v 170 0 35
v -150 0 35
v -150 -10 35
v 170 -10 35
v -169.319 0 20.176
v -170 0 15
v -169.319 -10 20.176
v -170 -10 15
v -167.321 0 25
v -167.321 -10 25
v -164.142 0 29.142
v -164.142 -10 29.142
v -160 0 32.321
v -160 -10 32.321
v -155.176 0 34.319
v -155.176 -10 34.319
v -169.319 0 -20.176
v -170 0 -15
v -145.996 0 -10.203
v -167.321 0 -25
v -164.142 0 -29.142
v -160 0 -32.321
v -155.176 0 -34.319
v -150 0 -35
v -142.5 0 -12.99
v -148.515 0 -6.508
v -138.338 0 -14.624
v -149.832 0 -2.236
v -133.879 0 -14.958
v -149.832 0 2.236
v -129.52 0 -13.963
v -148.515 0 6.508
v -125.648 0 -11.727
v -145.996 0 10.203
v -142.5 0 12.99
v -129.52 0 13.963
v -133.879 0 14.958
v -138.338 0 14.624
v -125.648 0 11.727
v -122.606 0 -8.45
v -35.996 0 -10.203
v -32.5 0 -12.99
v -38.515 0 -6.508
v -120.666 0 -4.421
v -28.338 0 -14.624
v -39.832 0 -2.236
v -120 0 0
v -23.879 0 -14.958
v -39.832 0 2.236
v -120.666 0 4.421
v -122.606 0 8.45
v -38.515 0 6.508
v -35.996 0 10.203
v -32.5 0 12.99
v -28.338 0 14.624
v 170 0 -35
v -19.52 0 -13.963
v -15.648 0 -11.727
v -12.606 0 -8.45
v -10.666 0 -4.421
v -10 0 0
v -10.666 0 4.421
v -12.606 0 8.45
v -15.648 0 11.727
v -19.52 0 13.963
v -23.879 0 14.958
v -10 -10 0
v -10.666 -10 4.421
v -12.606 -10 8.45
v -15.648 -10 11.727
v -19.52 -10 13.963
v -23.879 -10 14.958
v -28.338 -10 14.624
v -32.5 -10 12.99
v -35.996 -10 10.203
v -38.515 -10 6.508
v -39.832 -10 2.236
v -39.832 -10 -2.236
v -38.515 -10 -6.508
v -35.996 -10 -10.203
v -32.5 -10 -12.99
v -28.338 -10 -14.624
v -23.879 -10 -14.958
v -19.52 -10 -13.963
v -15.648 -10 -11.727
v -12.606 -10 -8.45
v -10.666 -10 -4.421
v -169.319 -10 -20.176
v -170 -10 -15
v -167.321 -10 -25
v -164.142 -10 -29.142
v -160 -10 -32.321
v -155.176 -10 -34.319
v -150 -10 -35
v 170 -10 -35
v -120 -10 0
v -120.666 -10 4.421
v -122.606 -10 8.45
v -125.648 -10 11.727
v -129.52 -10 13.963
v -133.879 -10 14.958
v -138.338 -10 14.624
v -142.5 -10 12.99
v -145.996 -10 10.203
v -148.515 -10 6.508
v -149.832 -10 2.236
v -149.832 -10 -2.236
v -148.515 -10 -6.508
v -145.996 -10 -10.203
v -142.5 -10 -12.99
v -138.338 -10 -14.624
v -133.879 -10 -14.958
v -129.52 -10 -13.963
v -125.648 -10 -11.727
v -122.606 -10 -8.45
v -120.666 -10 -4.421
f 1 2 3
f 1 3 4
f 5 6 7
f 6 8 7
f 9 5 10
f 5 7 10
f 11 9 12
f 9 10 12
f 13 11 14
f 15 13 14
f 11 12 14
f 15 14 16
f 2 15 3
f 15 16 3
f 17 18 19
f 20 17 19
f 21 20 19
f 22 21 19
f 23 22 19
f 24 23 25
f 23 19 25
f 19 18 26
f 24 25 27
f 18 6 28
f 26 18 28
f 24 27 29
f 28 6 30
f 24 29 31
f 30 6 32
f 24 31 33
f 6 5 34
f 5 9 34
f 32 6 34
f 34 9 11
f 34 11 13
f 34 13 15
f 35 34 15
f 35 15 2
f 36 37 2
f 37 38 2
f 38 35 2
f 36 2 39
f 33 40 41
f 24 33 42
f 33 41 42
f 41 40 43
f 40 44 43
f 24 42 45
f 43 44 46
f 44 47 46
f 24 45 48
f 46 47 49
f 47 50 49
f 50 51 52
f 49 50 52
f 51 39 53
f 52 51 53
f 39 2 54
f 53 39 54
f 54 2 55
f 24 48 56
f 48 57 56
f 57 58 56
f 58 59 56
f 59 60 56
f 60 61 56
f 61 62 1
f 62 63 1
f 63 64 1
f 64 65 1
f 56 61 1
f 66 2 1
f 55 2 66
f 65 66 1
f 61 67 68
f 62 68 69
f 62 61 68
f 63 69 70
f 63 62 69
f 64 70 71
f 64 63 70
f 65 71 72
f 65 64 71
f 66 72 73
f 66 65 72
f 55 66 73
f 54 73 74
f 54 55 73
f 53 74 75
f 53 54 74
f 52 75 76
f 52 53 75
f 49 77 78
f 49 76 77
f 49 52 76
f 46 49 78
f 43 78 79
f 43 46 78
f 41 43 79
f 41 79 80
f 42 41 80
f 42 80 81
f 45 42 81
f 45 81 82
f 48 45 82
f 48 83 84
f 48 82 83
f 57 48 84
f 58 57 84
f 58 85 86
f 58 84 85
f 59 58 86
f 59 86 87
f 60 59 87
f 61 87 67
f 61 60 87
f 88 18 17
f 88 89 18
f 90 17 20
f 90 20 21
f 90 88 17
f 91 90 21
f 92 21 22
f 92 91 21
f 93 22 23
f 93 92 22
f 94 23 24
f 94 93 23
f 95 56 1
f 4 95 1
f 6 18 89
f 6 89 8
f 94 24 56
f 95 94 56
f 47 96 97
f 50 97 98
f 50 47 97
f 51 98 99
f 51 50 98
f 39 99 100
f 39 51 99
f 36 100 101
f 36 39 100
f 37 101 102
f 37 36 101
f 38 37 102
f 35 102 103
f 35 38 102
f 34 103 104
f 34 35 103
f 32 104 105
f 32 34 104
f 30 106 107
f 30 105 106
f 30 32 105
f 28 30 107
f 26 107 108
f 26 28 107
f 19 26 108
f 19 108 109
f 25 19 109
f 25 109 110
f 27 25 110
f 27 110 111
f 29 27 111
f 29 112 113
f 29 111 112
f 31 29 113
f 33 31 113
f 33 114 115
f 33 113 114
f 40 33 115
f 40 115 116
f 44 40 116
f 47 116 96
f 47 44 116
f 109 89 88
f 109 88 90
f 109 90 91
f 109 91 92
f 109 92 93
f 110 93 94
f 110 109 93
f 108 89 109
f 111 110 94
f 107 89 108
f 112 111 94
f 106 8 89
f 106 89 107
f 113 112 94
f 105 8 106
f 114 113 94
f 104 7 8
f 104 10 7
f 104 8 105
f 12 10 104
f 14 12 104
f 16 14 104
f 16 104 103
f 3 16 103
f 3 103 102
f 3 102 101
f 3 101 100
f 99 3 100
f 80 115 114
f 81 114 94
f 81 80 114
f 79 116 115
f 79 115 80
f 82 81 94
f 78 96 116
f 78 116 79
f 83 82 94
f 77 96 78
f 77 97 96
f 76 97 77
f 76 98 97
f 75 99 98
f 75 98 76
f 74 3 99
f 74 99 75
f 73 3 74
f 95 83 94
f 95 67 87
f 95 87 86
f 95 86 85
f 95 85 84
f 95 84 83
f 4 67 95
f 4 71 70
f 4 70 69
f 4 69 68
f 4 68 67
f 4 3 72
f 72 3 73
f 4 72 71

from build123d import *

# Parameters (mm, degrees)
F0_W          = 340
F0_H          = 70
F1_DEPTH      = 10
F2_R          = 20
F3_R          = 15
F4_DEPTH      = 353
F4_DEPTH_BACK = 25


# Not quite as in the source:
# - an extrude ends at something that could not be found from the text; its depth is read off the source's solid


with BuildPart() as f1:
    # F0 (on Front) → F1 (new body)
    with BuildSketch(Plane.XZ):
        Rectangle(F0_W, F0_H)
    extrude(amount=F1_DEPTH)

    # F2
    f2_edges = [f1.edges().sort_by_distance(p)[0] for p in [
        (-170, -5, 35),
        (-170, -5, -35),
    ]]
    fillet(f2_edges, radius=F2_R)

    # F3 (on Front) → F4 (cut, two sides)
    with BuildSketch(Plane.XZ) as f4_sk:
        with Locations((-135, 0)):
            Circle(F3_R)
        with Locations((-25, 0)):
            Circle(F3_R)
    extrude(amount=-F4_DEPTH, mode=Mode.SUBTRACT)
    extrude(f4_sk.sketch, amount=F4_DEPTH_BACK, mode=Mode.SUBTRACT)


solid = f1.part
